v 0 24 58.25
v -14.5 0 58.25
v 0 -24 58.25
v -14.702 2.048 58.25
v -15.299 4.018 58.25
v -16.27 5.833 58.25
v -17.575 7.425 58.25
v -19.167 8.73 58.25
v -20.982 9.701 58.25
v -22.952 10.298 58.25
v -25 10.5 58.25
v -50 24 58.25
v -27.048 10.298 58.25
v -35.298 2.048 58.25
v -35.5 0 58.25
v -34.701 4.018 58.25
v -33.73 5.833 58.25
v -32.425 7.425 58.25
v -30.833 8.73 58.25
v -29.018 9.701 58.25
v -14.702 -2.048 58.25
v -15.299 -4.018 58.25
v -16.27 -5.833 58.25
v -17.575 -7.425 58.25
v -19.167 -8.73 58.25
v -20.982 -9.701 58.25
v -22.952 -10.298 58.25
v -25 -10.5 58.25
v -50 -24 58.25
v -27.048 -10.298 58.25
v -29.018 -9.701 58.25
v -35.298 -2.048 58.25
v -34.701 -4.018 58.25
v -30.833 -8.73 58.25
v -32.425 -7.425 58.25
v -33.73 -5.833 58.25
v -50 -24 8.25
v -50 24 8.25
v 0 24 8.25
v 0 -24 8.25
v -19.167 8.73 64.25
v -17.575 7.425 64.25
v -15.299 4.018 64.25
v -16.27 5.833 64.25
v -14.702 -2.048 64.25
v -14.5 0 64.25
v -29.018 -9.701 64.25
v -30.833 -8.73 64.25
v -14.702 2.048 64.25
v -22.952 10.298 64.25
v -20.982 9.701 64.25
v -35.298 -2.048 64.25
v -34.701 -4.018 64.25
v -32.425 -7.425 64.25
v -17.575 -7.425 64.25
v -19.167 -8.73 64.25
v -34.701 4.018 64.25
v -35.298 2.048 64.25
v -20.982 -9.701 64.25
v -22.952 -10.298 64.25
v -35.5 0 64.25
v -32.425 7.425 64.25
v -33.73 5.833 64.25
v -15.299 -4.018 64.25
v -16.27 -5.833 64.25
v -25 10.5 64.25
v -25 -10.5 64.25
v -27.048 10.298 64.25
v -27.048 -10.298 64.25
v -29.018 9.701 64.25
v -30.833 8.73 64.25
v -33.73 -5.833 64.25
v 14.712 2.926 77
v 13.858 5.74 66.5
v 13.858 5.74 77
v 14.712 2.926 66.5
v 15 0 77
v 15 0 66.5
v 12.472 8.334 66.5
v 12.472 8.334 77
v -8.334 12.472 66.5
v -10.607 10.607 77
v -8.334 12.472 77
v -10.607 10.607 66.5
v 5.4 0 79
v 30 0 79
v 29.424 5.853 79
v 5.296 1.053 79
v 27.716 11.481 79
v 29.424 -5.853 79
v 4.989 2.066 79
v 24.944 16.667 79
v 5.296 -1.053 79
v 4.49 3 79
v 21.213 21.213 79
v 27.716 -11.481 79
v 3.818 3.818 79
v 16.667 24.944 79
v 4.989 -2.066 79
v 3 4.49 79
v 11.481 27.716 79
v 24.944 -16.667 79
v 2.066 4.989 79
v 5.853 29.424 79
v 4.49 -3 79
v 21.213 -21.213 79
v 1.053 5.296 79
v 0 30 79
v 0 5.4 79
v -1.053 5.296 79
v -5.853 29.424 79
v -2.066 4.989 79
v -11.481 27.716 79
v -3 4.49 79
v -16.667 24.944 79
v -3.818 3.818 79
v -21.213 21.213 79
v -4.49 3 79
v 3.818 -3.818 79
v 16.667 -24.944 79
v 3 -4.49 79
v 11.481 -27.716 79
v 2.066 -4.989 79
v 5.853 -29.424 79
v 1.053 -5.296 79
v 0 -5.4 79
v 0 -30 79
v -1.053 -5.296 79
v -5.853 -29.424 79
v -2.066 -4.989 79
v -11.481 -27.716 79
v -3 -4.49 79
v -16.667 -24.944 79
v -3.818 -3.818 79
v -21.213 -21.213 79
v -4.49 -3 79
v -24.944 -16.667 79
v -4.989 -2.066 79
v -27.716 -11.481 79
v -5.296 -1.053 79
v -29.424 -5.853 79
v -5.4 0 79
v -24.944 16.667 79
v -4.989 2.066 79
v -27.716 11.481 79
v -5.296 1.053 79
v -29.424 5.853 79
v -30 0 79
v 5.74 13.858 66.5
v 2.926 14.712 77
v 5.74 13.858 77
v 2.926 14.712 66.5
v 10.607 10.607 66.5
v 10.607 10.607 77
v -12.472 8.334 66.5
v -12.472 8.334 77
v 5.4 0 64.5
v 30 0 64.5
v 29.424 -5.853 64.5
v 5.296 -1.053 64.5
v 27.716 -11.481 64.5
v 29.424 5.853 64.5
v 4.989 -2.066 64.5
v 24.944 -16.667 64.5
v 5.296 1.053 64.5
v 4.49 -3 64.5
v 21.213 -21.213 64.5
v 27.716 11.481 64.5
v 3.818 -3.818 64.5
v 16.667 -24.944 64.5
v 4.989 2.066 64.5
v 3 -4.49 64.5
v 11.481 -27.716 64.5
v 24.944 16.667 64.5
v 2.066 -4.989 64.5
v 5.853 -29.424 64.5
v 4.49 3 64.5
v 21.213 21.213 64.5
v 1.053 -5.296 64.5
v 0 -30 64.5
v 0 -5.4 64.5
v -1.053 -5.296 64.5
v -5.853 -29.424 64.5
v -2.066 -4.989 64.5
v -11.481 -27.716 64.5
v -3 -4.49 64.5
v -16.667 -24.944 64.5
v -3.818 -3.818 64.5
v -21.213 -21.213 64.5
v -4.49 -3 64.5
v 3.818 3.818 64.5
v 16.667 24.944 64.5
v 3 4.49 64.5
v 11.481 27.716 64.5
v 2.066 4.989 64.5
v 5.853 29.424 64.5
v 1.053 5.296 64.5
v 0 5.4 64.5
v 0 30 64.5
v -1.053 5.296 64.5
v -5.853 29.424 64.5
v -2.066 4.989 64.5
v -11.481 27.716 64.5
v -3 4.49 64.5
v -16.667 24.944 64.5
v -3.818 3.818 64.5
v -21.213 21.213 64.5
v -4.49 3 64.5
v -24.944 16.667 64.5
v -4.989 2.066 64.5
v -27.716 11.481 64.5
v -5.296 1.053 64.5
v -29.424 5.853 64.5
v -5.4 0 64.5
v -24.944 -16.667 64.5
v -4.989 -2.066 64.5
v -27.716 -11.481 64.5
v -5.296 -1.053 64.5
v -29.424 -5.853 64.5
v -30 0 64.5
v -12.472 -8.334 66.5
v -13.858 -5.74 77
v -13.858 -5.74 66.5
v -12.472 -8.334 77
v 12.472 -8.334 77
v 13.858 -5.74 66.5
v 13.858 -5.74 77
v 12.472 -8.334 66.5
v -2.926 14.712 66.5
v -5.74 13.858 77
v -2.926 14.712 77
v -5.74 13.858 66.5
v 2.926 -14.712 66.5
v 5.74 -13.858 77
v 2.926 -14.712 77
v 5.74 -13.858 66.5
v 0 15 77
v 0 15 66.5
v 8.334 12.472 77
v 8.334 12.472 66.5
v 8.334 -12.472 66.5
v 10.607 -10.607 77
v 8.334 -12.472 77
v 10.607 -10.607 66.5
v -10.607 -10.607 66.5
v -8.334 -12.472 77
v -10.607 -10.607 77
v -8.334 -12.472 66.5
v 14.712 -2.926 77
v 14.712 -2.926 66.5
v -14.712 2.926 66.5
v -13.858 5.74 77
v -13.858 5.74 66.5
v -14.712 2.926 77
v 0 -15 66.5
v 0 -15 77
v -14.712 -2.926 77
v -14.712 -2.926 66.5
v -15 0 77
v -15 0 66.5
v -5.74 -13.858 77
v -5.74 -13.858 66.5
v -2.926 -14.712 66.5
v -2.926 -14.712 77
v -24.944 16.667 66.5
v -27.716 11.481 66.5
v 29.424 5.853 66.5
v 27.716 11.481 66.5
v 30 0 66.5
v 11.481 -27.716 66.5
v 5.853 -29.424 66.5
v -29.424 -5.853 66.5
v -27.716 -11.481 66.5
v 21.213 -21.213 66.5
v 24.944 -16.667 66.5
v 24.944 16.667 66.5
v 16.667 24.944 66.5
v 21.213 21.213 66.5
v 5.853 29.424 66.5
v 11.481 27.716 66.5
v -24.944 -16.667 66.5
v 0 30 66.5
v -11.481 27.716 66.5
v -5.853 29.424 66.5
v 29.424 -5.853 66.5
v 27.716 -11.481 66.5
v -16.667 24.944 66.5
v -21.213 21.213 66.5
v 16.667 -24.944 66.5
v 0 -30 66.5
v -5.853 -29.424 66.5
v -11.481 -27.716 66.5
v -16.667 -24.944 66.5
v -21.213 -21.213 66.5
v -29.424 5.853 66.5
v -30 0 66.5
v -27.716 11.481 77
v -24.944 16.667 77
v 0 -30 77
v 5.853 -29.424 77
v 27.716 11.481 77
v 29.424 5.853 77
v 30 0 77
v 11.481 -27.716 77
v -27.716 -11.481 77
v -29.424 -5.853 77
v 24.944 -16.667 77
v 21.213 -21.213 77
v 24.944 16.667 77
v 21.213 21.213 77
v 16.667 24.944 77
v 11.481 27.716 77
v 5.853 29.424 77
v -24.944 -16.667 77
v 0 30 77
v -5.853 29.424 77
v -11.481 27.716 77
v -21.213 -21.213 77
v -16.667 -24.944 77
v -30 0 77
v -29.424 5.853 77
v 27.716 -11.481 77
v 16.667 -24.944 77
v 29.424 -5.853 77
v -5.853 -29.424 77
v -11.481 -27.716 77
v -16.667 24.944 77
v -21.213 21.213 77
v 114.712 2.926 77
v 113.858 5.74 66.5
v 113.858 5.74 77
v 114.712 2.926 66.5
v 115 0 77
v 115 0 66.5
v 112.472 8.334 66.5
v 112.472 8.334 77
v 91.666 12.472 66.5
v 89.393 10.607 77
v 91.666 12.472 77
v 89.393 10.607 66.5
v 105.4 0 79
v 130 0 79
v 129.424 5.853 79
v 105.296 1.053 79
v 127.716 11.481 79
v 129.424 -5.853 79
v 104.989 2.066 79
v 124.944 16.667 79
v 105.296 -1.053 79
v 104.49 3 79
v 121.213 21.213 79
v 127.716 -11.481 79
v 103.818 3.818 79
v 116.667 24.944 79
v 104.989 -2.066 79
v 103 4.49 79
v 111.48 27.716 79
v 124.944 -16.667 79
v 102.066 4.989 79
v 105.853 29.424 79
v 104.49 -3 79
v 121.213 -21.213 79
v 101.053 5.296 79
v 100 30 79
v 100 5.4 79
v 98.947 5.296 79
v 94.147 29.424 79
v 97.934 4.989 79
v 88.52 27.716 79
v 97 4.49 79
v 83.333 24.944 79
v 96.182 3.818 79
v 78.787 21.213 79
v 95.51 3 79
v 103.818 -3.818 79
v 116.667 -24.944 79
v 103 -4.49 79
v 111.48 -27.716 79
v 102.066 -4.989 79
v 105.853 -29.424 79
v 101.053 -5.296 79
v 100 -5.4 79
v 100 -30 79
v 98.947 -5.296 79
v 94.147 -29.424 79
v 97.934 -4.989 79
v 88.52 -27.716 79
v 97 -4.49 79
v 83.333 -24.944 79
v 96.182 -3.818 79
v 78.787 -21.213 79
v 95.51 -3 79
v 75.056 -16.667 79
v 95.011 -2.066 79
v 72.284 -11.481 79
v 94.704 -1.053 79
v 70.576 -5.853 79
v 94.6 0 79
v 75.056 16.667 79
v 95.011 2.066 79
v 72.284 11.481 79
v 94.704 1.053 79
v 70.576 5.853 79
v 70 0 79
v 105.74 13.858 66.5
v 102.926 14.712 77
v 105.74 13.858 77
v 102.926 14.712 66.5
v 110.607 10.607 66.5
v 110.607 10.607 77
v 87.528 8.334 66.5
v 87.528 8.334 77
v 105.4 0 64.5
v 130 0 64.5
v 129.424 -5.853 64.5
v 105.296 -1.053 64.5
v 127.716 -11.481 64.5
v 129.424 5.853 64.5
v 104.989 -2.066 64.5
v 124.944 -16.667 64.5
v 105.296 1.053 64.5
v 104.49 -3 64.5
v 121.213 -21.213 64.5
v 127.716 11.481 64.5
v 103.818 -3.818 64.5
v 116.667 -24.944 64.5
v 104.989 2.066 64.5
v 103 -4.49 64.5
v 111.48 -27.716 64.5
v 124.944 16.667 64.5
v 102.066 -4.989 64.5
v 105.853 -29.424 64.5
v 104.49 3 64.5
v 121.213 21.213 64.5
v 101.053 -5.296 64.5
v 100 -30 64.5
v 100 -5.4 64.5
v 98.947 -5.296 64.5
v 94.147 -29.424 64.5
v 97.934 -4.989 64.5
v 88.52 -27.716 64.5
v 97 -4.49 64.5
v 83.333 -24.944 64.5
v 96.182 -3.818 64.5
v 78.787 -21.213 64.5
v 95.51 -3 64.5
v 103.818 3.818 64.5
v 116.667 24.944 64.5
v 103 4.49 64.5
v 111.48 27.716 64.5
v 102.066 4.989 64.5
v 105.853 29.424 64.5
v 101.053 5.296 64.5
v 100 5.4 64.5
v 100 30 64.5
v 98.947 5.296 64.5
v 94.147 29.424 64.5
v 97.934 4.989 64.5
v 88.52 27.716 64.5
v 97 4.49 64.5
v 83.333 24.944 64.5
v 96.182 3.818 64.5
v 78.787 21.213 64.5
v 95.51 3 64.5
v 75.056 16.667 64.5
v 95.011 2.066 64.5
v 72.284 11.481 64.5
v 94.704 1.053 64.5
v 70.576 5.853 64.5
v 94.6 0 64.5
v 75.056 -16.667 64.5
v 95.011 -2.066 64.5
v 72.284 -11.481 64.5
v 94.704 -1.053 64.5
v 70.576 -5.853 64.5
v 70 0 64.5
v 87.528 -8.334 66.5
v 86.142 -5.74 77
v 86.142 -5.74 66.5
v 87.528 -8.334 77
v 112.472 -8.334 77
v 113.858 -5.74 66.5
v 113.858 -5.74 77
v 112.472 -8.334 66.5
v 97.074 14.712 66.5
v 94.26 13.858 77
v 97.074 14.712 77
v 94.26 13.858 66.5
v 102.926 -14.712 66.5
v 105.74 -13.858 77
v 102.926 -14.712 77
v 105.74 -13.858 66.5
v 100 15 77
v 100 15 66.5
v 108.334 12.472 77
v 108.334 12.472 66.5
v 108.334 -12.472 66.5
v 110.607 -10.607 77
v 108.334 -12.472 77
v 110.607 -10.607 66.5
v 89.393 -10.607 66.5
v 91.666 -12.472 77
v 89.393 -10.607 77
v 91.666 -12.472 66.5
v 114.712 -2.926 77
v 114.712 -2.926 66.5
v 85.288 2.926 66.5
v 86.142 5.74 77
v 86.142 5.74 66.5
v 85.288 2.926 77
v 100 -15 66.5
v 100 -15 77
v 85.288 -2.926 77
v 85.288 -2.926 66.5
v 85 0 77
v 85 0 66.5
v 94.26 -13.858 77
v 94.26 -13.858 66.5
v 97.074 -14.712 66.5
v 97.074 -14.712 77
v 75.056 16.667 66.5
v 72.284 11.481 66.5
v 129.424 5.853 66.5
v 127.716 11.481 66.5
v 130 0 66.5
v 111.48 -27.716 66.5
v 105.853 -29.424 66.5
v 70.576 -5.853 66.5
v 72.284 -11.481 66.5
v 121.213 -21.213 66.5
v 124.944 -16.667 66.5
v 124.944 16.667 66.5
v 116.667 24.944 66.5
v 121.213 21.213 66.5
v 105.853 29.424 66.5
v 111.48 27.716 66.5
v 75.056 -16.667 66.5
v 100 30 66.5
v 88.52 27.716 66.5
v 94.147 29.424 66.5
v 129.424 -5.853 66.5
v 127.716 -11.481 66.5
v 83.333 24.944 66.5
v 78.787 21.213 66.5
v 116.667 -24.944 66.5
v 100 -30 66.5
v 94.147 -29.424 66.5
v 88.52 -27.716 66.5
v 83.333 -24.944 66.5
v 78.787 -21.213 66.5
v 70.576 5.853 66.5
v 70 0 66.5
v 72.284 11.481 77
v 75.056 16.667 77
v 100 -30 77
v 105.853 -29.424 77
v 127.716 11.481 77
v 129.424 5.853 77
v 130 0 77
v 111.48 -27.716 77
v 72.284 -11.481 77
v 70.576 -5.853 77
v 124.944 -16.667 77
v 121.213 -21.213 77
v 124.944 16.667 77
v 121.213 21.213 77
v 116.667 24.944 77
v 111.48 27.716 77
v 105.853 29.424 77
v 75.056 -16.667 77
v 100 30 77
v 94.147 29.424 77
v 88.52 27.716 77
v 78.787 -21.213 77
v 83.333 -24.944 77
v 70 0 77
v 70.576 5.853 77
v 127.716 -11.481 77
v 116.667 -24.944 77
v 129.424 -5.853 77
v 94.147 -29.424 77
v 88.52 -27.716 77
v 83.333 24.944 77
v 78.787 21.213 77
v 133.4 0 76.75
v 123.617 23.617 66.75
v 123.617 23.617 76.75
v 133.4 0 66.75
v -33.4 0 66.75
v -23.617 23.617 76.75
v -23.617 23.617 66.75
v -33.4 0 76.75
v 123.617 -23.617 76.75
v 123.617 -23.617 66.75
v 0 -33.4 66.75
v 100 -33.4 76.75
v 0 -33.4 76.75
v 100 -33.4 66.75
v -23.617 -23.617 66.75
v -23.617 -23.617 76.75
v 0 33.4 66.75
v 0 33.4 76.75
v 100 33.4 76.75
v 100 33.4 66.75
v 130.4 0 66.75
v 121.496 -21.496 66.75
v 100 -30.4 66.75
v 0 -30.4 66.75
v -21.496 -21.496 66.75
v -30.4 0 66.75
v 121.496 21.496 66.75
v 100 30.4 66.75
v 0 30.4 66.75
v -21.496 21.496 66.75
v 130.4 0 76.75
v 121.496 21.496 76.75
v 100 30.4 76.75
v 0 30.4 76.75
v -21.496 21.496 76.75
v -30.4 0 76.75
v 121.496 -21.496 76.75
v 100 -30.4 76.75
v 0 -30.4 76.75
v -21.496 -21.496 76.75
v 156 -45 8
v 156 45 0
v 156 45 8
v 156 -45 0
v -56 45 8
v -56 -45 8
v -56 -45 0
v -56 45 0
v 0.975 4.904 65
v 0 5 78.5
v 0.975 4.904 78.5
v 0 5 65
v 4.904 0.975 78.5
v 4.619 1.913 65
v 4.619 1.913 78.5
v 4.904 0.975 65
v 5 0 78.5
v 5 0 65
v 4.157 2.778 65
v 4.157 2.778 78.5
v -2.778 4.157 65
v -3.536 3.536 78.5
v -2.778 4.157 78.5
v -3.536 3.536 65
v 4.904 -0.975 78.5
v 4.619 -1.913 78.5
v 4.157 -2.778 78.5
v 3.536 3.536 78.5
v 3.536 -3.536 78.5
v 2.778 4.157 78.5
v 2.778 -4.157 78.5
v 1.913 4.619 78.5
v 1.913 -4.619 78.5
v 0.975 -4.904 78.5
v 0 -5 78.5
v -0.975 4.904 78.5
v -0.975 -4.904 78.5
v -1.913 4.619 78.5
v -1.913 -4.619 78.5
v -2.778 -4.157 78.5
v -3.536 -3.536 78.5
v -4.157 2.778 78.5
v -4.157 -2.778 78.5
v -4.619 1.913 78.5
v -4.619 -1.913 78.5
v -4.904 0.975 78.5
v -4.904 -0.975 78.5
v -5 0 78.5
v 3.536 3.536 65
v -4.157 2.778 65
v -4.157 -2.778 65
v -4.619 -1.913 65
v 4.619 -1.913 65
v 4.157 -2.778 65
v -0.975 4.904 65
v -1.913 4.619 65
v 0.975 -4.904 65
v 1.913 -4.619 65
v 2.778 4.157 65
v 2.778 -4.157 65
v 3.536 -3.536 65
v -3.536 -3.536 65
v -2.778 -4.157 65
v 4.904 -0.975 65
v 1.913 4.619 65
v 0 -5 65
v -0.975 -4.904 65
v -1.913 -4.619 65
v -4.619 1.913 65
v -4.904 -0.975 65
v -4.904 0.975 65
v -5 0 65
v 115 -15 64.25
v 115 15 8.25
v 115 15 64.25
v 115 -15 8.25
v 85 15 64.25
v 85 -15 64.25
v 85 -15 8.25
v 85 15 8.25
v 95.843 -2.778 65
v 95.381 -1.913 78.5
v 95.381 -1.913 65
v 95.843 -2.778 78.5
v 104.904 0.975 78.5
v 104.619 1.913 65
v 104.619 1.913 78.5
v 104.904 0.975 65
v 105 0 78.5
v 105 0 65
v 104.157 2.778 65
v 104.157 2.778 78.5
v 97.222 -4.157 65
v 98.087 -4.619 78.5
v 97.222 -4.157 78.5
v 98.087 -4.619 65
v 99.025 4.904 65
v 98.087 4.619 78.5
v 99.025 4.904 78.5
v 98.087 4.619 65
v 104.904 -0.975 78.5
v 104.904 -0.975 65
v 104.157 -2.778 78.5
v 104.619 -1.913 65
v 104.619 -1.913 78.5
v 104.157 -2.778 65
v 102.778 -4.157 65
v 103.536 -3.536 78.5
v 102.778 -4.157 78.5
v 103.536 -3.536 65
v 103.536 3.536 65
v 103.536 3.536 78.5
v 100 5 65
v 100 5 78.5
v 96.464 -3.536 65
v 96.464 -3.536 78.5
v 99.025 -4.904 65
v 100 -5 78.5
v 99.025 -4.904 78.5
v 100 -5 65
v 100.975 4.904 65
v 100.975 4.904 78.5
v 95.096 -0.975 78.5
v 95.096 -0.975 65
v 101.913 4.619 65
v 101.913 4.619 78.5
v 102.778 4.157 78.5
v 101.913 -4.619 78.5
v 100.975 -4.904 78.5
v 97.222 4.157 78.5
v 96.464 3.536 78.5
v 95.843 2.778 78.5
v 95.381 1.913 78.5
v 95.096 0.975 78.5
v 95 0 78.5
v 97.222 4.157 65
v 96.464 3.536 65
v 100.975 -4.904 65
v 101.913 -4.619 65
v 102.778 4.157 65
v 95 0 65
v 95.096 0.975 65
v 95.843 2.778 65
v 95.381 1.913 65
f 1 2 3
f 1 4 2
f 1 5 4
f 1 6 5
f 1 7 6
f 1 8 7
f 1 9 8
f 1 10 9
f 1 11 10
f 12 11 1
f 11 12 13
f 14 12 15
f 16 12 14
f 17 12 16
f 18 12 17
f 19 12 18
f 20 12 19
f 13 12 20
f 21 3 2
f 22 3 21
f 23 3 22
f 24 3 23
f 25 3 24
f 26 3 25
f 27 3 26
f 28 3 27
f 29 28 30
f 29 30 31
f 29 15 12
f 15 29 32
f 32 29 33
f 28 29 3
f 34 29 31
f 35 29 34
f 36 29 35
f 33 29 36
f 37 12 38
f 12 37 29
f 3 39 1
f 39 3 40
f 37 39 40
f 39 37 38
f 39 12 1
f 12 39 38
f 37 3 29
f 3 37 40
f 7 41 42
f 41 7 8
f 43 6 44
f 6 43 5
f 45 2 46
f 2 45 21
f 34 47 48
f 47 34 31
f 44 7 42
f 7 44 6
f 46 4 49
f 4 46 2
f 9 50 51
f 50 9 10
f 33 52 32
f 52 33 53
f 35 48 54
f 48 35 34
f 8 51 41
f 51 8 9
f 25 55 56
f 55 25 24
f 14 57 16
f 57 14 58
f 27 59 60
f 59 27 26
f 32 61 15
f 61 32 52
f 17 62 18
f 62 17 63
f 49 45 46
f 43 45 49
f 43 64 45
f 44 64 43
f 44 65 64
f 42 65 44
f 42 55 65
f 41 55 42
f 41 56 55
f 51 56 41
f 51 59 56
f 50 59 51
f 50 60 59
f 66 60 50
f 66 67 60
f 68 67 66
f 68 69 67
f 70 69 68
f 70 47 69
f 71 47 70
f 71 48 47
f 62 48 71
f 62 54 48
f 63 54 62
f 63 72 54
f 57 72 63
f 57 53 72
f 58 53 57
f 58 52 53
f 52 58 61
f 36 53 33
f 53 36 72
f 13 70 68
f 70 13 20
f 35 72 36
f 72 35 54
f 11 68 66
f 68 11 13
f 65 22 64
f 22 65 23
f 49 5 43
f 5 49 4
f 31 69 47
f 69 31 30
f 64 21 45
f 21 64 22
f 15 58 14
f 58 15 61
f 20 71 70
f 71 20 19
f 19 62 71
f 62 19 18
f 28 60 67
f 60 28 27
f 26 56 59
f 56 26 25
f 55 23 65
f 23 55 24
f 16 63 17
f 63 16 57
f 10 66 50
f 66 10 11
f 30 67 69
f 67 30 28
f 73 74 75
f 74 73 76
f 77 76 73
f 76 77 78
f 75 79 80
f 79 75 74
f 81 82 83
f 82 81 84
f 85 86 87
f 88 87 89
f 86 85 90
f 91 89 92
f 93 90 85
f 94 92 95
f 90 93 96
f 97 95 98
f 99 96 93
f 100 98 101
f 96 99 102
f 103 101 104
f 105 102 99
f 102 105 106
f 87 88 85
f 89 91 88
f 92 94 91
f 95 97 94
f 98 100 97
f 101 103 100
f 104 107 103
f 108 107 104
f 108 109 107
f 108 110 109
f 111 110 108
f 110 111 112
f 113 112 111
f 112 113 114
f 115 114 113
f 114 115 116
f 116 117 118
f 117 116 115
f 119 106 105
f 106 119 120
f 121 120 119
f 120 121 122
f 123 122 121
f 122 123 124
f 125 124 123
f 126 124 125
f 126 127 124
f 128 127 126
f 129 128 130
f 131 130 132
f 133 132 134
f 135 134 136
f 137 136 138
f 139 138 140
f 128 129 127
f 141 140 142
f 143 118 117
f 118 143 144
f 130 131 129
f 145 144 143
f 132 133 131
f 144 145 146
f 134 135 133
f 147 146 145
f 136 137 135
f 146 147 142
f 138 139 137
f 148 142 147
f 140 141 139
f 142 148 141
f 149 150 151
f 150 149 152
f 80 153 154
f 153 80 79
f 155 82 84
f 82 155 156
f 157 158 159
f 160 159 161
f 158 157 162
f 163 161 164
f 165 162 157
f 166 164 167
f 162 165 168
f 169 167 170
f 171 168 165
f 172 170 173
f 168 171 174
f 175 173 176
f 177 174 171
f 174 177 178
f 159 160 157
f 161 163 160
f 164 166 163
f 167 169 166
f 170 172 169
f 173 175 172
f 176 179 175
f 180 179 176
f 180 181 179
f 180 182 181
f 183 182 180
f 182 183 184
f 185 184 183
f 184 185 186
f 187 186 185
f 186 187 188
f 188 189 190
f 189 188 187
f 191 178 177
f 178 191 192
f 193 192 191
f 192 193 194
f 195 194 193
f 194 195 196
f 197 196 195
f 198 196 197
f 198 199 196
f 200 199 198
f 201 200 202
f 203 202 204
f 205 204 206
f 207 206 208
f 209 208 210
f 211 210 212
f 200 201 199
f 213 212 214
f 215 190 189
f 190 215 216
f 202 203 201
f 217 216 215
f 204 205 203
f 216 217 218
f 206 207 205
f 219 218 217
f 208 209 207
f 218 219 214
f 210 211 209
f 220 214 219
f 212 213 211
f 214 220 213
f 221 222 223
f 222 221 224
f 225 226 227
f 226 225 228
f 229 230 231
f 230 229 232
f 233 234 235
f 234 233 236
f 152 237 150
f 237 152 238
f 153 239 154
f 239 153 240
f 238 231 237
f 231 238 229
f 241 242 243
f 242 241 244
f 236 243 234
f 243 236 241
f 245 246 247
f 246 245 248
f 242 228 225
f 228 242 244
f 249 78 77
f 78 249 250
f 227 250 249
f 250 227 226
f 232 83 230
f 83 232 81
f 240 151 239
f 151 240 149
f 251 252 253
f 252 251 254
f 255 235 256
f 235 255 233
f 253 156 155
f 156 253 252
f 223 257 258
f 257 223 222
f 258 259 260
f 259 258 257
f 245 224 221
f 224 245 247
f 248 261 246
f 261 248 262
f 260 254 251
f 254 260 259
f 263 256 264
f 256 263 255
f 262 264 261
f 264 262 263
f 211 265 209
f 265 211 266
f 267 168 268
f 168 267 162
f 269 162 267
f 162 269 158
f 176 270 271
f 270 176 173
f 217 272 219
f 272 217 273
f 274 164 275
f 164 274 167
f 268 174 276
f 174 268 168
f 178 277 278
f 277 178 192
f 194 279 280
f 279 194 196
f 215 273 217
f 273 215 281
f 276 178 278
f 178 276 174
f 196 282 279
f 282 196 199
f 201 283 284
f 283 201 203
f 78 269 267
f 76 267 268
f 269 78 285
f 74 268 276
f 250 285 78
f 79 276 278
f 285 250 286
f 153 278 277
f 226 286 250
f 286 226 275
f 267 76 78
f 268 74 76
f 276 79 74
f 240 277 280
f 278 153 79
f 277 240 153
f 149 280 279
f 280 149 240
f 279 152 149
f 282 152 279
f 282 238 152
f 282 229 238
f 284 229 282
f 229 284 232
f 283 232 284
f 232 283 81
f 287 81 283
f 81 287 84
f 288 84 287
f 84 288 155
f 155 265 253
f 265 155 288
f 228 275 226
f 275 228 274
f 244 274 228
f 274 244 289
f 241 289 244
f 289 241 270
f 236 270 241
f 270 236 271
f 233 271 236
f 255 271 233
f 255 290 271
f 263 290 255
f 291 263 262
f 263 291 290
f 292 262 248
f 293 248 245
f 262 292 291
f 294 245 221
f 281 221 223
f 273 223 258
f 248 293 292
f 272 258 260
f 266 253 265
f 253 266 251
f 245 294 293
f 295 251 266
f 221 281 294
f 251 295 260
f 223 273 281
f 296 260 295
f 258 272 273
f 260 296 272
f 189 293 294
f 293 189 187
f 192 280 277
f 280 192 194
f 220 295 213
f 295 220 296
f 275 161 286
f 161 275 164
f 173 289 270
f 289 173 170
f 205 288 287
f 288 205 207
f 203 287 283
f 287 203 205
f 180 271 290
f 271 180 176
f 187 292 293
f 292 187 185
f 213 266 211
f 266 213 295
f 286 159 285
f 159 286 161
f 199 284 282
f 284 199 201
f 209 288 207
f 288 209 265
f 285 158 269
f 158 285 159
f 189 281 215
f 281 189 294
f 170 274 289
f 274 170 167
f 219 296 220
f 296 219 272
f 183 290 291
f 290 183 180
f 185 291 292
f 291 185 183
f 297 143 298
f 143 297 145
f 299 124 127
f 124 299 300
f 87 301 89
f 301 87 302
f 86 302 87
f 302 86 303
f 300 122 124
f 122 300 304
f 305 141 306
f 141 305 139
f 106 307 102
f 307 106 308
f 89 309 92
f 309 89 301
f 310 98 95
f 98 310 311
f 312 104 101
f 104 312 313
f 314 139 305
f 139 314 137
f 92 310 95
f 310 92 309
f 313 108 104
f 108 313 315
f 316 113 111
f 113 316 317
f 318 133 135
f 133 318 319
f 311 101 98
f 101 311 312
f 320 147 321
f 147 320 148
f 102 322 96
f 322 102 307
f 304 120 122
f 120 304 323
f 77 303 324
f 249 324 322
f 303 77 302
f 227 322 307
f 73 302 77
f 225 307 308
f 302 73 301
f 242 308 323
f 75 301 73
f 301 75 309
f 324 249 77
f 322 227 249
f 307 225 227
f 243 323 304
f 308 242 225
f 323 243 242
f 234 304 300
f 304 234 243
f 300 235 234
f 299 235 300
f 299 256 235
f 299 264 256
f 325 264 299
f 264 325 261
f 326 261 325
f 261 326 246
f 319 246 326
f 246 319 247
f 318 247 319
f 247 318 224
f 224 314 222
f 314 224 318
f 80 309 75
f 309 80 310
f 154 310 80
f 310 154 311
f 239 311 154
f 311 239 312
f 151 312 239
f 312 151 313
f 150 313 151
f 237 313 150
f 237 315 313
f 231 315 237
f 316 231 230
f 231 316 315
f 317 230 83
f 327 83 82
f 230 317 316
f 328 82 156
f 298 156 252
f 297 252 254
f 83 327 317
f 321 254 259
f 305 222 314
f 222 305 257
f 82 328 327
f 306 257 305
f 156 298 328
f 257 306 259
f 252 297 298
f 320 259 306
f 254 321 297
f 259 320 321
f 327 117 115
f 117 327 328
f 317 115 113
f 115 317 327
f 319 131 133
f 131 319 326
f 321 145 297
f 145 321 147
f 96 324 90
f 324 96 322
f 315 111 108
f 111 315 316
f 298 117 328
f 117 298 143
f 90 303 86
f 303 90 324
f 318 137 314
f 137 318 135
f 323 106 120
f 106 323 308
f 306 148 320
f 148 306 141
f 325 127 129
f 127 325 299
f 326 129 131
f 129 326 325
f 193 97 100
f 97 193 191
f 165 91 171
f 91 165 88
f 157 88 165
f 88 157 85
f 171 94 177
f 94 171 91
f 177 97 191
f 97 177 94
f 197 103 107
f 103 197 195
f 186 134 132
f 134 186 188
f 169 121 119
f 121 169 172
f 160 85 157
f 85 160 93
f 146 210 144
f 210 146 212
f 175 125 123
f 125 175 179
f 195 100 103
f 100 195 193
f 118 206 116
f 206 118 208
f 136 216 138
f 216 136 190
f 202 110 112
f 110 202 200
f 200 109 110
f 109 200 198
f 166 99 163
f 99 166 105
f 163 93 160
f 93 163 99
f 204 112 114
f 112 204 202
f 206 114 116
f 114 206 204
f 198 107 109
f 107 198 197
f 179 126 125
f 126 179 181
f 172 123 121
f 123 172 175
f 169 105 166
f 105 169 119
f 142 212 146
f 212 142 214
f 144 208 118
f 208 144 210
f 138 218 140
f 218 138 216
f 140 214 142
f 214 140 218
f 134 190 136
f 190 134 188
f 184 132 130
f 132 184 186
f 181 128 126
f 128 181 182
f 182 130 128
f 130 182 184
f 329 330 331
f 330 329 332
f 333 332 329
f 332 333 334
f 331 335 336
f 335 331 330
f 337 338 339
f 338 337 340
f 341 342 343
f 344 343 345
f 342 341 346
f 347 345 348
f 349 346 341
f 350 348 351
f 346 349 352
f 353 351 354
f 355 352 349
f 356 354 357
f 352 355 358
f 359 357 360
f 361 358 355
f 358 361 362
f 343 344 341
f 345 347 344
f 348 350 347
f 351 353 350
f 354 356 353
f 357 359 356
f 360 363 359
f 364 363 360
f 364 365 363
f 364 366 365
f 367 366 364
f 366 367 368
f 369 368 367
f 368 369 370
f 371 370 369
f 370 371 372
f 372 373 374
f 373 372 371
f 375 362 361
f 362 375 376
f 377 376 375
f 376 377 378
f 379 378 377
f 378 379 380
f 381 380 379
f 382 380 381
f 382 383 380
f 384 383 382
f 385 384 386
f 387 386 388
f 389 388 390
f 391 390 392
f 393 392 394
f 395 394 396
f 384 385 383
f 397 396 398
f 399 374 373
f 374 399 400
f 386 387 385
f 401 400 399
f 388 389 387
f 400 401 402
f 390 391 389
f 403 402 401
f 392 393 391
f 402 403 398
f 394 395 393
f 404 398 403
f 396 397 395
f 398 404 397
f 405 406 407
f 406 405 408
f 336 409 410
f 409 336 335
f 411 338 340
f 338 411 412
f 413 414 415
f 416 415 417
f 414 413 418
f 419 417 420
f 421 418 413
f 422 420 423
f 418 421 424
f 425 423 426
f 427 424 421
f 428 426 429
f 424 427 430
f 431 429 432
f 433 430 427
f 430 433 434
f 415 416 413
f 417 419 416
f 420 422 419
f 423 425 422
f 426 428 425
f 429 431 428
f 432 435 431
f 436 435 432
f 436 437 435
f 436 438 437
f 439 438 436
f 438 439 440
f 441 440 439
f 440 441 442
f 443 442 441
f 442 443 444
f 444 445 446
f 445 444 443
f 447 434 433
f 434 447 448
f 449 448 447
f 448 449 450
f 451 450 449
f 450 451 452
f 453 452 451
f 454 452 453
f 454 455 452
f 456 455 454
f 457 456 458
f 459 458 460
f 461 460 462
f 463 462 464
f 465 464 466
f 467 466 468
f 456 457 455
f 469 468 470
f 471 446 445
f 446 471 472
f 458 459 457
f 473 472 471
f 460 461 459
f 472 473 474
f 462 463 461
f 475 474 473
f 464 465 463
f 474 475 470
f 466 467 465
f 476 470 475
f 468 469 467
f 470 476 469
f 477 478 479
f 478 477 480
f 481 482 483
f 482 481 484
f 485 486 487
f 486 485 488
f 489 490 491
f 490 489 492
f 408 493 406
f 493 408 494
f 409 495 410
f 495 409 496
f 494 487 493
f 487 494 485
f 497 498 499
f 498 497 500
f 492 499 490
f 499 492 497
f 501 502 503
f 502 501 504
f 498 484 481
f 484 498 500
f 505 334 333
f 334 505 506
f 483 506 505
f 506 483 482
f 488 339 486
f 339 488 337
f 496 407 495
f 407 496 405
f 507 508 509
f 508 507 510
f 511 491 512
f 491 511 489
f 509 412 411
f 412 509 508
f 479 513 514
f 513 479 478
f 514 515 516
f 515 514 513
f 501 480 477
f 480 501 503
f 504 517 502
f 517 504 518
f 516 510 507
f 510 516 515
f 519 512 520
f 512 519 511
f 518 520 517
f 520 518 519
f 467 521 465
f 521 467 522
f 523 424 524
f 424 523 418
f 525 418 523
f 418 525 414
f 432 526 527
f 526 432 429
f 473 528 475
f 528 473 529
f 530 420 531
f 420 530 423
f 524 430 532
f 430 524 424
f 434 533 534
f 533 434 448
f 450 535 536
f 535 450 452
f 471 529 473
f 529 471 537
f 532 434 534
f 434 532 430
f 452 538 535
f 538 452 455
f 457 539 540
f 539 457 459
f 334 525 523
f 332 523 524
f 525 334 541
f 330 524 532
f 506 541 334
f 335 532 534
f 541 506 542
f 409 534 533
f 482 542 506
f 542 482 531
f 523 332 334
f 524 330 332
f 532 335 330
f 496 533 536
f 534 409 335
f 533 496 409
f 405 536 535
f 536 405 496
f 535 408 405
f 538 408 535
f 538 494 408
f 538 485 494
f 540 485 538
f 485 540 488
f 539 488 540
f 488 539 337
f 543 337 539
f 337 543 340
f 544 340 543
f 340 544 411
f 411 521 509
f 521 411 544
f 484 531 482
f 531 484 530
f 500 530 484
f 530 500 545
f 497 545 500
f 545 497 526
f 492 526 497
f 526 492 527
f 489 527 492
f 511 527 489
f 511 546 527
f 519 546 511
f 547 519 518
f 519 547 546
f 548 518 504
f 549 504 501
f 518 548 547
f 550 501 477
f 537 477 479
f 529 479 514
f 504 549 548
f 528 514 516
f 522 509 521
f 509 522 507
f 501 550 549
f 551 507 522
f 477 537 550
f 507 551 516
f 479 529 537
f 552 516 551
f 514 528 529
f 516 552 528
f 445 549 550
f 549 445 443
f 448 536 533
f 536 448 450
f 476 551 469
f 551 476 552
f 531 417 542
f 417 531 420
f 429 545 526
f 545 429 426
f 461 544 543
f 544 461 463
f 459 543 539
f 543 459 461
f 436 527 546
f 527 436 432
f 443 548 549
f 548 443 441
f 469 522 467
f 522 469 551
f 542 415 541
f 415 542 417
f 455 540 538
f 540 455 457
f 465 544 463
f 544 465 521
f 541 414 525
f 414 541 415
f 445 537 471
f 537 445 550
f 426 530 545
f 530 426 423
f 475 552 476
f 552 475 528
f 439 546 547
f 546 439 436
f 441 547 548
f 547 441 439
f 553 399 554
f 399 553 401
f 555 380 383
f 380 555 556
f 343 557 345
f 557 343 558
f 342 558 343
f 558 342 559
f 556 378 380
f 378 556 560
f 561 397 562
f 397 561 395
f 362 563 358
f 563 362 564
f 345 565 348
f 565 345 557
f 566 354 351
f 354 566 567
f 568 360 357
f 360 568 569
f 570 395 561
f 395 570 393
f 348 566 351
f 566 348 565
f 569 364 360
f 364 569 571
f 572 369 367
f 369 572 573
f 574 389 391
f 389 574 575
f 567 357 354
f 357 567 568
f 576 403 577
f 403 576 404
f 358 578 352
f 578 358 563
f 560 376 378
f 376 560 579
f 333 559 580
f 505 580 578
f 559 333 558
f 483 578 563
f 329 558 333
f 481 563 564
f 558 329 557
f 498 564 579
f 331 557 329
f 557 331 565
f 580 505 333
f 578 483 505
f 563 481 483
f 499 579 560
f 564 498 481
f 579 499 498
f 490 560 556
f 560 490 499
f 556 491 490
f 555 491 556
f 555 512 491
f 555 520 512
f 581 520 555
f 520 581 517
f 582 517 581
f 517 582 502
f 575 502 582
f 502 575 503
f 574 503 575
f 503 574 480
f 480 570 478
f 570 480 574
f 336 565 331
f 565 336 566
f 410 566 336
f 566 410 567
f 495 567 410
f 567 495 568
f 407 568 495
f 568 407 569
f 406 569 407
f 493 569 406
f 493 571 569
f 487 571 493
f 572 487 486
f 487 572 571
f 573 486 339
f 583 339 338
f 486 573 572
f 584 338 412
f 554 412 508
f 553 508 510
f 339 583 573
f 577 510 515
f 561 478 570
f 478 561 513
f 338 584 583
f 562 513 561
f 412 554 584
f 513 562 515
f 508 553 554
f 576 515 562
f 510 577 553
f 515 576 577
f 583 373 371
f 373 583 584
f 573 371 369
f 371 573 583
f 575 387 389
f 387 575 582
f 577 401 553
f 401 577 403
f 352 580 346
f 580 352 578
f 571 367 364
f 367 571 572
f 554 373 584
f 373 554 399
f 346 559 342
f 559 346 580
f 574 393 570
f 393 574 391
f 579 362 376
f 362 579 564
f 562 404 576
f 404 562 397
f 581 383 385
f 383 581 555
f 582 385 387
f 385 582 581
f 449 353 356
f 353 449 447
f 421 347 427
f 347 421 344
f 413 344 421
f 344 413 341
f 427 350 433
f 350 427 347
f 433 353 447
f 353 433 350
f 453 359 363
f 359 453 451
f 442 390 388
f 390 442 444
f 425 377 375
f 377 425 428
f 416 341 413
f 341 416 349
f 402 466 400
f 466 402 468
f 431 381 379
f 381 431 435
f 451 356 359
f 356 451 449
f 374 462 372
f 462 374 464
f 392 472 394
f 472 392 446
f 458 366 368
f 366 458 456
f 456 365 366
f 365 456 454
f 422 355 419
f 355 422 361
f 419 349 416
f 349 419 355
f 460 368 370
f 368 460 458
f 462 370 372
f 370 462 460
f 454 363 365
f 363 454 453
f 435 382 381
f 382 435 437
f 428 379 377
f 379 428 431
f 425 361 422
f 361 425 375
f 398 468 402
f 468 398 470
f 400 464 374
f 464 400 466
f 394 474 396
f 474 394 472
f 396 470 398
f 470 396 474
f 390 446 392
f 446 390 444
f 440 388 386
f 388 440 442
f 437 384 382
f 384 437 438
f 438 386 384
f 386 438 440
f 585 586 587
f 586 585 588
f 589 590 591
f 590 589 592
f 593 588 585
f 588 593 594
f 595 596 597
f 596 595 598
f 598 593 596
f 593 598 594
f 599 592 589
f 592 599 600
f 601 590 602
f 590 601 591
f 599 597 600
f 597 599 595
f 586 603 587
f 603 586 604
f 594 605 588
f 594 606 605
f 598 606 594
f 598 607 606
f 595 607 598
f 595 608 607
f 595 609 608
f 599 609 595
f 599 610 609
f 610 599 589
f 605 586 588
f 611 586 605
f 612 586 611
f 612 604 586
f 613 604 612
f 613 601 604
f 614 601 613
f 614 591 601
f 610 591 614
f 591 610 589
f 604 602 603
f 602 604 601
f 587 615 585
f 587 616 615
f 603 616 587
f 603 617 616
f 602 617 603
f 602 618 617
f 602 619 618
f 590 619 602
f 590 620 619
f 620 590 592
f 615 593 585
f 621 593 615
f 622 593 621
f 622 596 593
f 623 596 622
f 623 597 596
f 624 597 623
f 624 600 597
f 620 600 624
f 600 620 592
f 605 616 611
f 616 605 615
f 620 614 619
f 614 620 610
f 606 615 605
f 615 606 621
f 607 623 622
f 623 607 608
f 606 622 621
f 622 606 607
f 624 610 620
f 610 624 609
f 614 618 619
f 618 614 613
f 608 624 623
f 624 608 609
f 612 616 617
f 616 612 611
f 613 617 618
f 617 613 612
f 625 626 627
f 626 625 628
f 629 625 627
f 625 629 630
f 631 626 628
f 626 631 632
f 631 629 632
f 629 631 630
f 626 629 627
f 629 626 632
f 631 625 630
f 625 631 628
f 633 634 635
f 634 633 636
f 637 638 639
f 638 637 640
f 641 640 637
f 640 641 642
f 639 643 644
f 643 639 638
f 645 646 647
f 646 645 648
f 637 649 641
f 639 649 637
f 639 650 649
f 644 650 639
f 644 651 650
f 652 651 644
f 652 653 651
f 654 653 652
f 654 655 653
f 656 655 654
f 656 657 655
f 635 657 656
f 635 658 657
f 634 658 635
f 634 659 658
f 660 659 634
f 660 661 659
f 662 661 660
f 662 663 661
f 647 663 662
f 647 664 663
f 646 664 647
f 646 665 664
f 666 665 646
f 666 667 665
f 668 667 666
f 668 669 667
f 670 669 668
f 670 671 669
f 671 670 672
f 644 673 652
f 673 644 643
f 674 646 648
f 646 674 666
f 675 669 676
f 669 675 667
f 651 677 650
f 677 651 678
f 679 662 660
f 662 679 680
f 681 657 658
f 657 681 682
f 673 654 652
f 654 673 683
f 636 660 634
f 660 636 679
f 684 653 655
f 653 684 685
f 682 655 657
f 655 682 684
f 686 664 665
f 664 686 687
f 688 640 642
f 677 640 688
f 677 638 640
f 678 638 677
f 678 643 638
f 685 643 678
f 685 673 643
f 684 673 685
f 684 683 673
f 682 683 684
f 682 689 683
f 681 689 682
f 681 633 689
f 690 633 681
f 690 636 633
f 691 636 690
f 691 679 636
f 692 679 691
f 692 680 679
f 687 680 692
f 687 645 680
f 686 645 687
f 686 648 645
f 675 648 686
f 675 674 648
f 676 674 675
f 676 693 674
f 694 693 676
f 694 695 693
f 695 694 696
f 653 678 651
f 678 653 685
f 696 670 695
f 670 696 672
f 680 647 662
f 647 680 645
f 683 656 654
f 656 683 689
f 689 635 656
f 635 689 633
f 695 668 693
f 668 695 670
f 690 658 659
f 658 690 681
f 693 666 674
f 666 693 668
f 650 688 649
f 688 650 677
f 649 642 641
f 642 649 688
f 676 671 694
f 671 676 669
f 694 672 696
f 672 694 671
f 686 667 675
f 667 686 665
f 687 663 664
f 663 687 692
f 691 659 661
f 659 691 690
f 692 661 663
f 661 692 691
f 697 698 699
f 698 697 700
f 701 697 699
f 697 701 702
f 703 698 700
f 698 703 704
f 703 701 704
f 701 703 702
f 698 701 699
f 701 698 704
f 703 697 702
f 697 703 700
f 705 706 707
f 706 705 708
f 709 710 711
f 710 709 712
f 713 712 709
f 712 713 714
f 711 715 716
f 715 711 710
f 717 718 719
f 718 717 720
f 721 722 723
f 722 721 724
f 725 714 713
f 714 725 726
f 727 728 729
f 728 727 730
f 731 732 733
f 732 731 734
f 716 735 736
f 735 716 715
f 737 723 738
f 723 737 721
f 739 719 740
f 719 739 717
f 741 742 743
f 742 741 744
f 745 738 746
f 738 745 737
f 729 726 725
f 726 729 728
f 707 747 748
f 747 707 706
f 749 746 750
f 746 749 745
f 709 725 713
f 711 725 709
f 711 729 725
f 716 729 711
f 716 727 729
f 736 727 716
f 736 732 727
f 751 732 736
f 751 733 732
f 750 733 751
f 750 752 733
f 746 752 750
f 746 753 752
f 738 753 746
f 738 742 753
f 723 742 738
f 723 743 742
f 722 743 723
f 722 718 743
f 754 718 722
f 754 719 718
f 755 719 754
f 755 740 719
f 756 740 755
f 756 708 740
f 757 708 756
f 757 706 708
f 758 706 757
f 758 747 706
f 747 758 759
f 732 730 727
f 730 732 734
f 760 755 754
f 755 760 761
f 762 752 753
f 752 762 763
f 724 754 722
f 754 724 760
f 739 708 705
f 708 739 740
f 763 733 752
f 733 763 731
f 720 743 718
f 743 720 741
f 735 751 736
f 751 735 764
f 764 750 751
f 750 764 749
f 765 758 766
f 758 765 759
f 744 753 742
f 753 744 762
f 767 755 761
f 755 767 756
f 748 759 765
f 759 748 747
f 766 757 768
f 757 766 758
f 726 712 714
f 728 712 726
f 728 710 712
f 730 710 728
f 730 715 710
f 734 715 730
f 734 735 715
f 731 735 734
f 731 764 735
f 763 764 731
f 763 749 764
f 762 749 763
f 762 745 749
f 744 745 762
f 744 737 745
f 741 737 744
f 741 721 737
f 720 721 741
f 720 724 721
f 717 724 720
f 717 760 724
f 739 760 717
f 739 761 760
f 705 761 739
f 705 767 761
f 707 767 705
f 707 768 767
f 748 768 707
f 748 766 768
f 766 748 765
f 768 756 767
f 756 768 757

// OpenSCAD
$fn = 32;

// ------------------------------------------------------------------------
// Motor belt drive: span 100 mm, pulleys d60, belt 10 mm wide
// Every part is its own module, assembly() places every instance.
// ------------------------------------------------------------------------

// --- part 1 ---
module base_plate() {
  difference() {
    translate([-106, -45, 0]) cube([212, 90, 8]);
  }
}

// --- part 2 ---
module motor() {
  union() {
    translate([-25, -24, 0]) cube([50, 48, 50]);
    translate([28, 0, 25]) rotate([0, 90, 0]) cylinder(h = 6, d = 21, center = true);
  }
}

// --- part 3 ---
module drive_shaft() {
  translate([0, 0, -6.75]) cylinder(h = 13.5, d = 10);
}

// --- part 4 ---
module pulley_drive() {
  difference() {
    union() {
      cylinder(h = 14.5, d = 30);
      cylinder(h = 2, d = 60);
      translate([0, 0, 12.5]) cylinder(h = 2, d = 60);
    }
    translate([0, 0, -1]) cylinder(h = 16.5, d = 10.8);
  }
}

// --- part 5 ---
module idler_post() {
  translate([-15, -15, 0]) cube([30, 30, 56]);
}

// --- part 6 ---
module driven_shaft() {
  translate([0, 0, -6.75]) cylinder(h = 13.5, d = 10);
}

// --- part 7 ---
module pulley_driven() {
  difference() {
    union() {
      cylinder(h = 14.5, d = 30);
      cylinder(h = 2, d = 60);
      translate([0, 0, 12.5]) cylinder(h = 2, d = 60);
    }
    translate([0, 0, -1]) cylinder(h = 16.5, d = 10.8);
  }
}

// --- part 8 ---
module drive_belt() {
  difference() {
    linear_extrude(height = 10) polygon(points = concat([for (a = [90 : 45 : 270]) [33.4 * cos(a), 33.4 * sin(a)]], [for (a = [270 : 45 : 450]) [100 + 33.4 * cos(a), 33.4 * sin(a)]]));
    translate([0, 0, -1]) linear_extrude(height = 12) polygon(points = concat([for (a = [90 : 45 : 270]) [30.4 * cos(a), 30.4 * sin(a)]], [for (a = [270 : 45 : 450]) [100 + 30.4 * cos(a), 30.4 * sin(a)]]));
  }
}

// --- assembly ---
module assembly() {
  color([0.80, 0.24, 0.20]) translate([50, 0, 0]) rotate([0, 0, 0]) base_plate();
  color([0.20, 0.45, 0.75]) translate([0, 0, 33.25]) rotate([0, 270, 0]) motor();
  color([0.25, 0.62, 0.32]) translate([0, 0, 71.75]) rotate([0, 0, 0]) drive_shaft();
  color([0.92, 0.70, 0.18]) translate([0, 0, 64.5]) rotate([0, 0, 0]) pulley_drive();
  color([0.58, 0.35, 0.70]) translate([100, 0, 8.25]) rotate([0, 0, 0]) idler_post();
  color([0.16, 0.66, 0.66]) translate([100, 0, 71.75]) rotate([0, 0, 0]) driven_shaft();
  color([0.85, 0.48, 0.18]) translate([100, 0, 64.5]) rotate([0, 0, 0]) pulley_driven();
  color([0.55, 0.60, 0.65]) translate([0, 0, 66.75]) rotate([0, 0, 0]) drive_belt();
}

assembly();
